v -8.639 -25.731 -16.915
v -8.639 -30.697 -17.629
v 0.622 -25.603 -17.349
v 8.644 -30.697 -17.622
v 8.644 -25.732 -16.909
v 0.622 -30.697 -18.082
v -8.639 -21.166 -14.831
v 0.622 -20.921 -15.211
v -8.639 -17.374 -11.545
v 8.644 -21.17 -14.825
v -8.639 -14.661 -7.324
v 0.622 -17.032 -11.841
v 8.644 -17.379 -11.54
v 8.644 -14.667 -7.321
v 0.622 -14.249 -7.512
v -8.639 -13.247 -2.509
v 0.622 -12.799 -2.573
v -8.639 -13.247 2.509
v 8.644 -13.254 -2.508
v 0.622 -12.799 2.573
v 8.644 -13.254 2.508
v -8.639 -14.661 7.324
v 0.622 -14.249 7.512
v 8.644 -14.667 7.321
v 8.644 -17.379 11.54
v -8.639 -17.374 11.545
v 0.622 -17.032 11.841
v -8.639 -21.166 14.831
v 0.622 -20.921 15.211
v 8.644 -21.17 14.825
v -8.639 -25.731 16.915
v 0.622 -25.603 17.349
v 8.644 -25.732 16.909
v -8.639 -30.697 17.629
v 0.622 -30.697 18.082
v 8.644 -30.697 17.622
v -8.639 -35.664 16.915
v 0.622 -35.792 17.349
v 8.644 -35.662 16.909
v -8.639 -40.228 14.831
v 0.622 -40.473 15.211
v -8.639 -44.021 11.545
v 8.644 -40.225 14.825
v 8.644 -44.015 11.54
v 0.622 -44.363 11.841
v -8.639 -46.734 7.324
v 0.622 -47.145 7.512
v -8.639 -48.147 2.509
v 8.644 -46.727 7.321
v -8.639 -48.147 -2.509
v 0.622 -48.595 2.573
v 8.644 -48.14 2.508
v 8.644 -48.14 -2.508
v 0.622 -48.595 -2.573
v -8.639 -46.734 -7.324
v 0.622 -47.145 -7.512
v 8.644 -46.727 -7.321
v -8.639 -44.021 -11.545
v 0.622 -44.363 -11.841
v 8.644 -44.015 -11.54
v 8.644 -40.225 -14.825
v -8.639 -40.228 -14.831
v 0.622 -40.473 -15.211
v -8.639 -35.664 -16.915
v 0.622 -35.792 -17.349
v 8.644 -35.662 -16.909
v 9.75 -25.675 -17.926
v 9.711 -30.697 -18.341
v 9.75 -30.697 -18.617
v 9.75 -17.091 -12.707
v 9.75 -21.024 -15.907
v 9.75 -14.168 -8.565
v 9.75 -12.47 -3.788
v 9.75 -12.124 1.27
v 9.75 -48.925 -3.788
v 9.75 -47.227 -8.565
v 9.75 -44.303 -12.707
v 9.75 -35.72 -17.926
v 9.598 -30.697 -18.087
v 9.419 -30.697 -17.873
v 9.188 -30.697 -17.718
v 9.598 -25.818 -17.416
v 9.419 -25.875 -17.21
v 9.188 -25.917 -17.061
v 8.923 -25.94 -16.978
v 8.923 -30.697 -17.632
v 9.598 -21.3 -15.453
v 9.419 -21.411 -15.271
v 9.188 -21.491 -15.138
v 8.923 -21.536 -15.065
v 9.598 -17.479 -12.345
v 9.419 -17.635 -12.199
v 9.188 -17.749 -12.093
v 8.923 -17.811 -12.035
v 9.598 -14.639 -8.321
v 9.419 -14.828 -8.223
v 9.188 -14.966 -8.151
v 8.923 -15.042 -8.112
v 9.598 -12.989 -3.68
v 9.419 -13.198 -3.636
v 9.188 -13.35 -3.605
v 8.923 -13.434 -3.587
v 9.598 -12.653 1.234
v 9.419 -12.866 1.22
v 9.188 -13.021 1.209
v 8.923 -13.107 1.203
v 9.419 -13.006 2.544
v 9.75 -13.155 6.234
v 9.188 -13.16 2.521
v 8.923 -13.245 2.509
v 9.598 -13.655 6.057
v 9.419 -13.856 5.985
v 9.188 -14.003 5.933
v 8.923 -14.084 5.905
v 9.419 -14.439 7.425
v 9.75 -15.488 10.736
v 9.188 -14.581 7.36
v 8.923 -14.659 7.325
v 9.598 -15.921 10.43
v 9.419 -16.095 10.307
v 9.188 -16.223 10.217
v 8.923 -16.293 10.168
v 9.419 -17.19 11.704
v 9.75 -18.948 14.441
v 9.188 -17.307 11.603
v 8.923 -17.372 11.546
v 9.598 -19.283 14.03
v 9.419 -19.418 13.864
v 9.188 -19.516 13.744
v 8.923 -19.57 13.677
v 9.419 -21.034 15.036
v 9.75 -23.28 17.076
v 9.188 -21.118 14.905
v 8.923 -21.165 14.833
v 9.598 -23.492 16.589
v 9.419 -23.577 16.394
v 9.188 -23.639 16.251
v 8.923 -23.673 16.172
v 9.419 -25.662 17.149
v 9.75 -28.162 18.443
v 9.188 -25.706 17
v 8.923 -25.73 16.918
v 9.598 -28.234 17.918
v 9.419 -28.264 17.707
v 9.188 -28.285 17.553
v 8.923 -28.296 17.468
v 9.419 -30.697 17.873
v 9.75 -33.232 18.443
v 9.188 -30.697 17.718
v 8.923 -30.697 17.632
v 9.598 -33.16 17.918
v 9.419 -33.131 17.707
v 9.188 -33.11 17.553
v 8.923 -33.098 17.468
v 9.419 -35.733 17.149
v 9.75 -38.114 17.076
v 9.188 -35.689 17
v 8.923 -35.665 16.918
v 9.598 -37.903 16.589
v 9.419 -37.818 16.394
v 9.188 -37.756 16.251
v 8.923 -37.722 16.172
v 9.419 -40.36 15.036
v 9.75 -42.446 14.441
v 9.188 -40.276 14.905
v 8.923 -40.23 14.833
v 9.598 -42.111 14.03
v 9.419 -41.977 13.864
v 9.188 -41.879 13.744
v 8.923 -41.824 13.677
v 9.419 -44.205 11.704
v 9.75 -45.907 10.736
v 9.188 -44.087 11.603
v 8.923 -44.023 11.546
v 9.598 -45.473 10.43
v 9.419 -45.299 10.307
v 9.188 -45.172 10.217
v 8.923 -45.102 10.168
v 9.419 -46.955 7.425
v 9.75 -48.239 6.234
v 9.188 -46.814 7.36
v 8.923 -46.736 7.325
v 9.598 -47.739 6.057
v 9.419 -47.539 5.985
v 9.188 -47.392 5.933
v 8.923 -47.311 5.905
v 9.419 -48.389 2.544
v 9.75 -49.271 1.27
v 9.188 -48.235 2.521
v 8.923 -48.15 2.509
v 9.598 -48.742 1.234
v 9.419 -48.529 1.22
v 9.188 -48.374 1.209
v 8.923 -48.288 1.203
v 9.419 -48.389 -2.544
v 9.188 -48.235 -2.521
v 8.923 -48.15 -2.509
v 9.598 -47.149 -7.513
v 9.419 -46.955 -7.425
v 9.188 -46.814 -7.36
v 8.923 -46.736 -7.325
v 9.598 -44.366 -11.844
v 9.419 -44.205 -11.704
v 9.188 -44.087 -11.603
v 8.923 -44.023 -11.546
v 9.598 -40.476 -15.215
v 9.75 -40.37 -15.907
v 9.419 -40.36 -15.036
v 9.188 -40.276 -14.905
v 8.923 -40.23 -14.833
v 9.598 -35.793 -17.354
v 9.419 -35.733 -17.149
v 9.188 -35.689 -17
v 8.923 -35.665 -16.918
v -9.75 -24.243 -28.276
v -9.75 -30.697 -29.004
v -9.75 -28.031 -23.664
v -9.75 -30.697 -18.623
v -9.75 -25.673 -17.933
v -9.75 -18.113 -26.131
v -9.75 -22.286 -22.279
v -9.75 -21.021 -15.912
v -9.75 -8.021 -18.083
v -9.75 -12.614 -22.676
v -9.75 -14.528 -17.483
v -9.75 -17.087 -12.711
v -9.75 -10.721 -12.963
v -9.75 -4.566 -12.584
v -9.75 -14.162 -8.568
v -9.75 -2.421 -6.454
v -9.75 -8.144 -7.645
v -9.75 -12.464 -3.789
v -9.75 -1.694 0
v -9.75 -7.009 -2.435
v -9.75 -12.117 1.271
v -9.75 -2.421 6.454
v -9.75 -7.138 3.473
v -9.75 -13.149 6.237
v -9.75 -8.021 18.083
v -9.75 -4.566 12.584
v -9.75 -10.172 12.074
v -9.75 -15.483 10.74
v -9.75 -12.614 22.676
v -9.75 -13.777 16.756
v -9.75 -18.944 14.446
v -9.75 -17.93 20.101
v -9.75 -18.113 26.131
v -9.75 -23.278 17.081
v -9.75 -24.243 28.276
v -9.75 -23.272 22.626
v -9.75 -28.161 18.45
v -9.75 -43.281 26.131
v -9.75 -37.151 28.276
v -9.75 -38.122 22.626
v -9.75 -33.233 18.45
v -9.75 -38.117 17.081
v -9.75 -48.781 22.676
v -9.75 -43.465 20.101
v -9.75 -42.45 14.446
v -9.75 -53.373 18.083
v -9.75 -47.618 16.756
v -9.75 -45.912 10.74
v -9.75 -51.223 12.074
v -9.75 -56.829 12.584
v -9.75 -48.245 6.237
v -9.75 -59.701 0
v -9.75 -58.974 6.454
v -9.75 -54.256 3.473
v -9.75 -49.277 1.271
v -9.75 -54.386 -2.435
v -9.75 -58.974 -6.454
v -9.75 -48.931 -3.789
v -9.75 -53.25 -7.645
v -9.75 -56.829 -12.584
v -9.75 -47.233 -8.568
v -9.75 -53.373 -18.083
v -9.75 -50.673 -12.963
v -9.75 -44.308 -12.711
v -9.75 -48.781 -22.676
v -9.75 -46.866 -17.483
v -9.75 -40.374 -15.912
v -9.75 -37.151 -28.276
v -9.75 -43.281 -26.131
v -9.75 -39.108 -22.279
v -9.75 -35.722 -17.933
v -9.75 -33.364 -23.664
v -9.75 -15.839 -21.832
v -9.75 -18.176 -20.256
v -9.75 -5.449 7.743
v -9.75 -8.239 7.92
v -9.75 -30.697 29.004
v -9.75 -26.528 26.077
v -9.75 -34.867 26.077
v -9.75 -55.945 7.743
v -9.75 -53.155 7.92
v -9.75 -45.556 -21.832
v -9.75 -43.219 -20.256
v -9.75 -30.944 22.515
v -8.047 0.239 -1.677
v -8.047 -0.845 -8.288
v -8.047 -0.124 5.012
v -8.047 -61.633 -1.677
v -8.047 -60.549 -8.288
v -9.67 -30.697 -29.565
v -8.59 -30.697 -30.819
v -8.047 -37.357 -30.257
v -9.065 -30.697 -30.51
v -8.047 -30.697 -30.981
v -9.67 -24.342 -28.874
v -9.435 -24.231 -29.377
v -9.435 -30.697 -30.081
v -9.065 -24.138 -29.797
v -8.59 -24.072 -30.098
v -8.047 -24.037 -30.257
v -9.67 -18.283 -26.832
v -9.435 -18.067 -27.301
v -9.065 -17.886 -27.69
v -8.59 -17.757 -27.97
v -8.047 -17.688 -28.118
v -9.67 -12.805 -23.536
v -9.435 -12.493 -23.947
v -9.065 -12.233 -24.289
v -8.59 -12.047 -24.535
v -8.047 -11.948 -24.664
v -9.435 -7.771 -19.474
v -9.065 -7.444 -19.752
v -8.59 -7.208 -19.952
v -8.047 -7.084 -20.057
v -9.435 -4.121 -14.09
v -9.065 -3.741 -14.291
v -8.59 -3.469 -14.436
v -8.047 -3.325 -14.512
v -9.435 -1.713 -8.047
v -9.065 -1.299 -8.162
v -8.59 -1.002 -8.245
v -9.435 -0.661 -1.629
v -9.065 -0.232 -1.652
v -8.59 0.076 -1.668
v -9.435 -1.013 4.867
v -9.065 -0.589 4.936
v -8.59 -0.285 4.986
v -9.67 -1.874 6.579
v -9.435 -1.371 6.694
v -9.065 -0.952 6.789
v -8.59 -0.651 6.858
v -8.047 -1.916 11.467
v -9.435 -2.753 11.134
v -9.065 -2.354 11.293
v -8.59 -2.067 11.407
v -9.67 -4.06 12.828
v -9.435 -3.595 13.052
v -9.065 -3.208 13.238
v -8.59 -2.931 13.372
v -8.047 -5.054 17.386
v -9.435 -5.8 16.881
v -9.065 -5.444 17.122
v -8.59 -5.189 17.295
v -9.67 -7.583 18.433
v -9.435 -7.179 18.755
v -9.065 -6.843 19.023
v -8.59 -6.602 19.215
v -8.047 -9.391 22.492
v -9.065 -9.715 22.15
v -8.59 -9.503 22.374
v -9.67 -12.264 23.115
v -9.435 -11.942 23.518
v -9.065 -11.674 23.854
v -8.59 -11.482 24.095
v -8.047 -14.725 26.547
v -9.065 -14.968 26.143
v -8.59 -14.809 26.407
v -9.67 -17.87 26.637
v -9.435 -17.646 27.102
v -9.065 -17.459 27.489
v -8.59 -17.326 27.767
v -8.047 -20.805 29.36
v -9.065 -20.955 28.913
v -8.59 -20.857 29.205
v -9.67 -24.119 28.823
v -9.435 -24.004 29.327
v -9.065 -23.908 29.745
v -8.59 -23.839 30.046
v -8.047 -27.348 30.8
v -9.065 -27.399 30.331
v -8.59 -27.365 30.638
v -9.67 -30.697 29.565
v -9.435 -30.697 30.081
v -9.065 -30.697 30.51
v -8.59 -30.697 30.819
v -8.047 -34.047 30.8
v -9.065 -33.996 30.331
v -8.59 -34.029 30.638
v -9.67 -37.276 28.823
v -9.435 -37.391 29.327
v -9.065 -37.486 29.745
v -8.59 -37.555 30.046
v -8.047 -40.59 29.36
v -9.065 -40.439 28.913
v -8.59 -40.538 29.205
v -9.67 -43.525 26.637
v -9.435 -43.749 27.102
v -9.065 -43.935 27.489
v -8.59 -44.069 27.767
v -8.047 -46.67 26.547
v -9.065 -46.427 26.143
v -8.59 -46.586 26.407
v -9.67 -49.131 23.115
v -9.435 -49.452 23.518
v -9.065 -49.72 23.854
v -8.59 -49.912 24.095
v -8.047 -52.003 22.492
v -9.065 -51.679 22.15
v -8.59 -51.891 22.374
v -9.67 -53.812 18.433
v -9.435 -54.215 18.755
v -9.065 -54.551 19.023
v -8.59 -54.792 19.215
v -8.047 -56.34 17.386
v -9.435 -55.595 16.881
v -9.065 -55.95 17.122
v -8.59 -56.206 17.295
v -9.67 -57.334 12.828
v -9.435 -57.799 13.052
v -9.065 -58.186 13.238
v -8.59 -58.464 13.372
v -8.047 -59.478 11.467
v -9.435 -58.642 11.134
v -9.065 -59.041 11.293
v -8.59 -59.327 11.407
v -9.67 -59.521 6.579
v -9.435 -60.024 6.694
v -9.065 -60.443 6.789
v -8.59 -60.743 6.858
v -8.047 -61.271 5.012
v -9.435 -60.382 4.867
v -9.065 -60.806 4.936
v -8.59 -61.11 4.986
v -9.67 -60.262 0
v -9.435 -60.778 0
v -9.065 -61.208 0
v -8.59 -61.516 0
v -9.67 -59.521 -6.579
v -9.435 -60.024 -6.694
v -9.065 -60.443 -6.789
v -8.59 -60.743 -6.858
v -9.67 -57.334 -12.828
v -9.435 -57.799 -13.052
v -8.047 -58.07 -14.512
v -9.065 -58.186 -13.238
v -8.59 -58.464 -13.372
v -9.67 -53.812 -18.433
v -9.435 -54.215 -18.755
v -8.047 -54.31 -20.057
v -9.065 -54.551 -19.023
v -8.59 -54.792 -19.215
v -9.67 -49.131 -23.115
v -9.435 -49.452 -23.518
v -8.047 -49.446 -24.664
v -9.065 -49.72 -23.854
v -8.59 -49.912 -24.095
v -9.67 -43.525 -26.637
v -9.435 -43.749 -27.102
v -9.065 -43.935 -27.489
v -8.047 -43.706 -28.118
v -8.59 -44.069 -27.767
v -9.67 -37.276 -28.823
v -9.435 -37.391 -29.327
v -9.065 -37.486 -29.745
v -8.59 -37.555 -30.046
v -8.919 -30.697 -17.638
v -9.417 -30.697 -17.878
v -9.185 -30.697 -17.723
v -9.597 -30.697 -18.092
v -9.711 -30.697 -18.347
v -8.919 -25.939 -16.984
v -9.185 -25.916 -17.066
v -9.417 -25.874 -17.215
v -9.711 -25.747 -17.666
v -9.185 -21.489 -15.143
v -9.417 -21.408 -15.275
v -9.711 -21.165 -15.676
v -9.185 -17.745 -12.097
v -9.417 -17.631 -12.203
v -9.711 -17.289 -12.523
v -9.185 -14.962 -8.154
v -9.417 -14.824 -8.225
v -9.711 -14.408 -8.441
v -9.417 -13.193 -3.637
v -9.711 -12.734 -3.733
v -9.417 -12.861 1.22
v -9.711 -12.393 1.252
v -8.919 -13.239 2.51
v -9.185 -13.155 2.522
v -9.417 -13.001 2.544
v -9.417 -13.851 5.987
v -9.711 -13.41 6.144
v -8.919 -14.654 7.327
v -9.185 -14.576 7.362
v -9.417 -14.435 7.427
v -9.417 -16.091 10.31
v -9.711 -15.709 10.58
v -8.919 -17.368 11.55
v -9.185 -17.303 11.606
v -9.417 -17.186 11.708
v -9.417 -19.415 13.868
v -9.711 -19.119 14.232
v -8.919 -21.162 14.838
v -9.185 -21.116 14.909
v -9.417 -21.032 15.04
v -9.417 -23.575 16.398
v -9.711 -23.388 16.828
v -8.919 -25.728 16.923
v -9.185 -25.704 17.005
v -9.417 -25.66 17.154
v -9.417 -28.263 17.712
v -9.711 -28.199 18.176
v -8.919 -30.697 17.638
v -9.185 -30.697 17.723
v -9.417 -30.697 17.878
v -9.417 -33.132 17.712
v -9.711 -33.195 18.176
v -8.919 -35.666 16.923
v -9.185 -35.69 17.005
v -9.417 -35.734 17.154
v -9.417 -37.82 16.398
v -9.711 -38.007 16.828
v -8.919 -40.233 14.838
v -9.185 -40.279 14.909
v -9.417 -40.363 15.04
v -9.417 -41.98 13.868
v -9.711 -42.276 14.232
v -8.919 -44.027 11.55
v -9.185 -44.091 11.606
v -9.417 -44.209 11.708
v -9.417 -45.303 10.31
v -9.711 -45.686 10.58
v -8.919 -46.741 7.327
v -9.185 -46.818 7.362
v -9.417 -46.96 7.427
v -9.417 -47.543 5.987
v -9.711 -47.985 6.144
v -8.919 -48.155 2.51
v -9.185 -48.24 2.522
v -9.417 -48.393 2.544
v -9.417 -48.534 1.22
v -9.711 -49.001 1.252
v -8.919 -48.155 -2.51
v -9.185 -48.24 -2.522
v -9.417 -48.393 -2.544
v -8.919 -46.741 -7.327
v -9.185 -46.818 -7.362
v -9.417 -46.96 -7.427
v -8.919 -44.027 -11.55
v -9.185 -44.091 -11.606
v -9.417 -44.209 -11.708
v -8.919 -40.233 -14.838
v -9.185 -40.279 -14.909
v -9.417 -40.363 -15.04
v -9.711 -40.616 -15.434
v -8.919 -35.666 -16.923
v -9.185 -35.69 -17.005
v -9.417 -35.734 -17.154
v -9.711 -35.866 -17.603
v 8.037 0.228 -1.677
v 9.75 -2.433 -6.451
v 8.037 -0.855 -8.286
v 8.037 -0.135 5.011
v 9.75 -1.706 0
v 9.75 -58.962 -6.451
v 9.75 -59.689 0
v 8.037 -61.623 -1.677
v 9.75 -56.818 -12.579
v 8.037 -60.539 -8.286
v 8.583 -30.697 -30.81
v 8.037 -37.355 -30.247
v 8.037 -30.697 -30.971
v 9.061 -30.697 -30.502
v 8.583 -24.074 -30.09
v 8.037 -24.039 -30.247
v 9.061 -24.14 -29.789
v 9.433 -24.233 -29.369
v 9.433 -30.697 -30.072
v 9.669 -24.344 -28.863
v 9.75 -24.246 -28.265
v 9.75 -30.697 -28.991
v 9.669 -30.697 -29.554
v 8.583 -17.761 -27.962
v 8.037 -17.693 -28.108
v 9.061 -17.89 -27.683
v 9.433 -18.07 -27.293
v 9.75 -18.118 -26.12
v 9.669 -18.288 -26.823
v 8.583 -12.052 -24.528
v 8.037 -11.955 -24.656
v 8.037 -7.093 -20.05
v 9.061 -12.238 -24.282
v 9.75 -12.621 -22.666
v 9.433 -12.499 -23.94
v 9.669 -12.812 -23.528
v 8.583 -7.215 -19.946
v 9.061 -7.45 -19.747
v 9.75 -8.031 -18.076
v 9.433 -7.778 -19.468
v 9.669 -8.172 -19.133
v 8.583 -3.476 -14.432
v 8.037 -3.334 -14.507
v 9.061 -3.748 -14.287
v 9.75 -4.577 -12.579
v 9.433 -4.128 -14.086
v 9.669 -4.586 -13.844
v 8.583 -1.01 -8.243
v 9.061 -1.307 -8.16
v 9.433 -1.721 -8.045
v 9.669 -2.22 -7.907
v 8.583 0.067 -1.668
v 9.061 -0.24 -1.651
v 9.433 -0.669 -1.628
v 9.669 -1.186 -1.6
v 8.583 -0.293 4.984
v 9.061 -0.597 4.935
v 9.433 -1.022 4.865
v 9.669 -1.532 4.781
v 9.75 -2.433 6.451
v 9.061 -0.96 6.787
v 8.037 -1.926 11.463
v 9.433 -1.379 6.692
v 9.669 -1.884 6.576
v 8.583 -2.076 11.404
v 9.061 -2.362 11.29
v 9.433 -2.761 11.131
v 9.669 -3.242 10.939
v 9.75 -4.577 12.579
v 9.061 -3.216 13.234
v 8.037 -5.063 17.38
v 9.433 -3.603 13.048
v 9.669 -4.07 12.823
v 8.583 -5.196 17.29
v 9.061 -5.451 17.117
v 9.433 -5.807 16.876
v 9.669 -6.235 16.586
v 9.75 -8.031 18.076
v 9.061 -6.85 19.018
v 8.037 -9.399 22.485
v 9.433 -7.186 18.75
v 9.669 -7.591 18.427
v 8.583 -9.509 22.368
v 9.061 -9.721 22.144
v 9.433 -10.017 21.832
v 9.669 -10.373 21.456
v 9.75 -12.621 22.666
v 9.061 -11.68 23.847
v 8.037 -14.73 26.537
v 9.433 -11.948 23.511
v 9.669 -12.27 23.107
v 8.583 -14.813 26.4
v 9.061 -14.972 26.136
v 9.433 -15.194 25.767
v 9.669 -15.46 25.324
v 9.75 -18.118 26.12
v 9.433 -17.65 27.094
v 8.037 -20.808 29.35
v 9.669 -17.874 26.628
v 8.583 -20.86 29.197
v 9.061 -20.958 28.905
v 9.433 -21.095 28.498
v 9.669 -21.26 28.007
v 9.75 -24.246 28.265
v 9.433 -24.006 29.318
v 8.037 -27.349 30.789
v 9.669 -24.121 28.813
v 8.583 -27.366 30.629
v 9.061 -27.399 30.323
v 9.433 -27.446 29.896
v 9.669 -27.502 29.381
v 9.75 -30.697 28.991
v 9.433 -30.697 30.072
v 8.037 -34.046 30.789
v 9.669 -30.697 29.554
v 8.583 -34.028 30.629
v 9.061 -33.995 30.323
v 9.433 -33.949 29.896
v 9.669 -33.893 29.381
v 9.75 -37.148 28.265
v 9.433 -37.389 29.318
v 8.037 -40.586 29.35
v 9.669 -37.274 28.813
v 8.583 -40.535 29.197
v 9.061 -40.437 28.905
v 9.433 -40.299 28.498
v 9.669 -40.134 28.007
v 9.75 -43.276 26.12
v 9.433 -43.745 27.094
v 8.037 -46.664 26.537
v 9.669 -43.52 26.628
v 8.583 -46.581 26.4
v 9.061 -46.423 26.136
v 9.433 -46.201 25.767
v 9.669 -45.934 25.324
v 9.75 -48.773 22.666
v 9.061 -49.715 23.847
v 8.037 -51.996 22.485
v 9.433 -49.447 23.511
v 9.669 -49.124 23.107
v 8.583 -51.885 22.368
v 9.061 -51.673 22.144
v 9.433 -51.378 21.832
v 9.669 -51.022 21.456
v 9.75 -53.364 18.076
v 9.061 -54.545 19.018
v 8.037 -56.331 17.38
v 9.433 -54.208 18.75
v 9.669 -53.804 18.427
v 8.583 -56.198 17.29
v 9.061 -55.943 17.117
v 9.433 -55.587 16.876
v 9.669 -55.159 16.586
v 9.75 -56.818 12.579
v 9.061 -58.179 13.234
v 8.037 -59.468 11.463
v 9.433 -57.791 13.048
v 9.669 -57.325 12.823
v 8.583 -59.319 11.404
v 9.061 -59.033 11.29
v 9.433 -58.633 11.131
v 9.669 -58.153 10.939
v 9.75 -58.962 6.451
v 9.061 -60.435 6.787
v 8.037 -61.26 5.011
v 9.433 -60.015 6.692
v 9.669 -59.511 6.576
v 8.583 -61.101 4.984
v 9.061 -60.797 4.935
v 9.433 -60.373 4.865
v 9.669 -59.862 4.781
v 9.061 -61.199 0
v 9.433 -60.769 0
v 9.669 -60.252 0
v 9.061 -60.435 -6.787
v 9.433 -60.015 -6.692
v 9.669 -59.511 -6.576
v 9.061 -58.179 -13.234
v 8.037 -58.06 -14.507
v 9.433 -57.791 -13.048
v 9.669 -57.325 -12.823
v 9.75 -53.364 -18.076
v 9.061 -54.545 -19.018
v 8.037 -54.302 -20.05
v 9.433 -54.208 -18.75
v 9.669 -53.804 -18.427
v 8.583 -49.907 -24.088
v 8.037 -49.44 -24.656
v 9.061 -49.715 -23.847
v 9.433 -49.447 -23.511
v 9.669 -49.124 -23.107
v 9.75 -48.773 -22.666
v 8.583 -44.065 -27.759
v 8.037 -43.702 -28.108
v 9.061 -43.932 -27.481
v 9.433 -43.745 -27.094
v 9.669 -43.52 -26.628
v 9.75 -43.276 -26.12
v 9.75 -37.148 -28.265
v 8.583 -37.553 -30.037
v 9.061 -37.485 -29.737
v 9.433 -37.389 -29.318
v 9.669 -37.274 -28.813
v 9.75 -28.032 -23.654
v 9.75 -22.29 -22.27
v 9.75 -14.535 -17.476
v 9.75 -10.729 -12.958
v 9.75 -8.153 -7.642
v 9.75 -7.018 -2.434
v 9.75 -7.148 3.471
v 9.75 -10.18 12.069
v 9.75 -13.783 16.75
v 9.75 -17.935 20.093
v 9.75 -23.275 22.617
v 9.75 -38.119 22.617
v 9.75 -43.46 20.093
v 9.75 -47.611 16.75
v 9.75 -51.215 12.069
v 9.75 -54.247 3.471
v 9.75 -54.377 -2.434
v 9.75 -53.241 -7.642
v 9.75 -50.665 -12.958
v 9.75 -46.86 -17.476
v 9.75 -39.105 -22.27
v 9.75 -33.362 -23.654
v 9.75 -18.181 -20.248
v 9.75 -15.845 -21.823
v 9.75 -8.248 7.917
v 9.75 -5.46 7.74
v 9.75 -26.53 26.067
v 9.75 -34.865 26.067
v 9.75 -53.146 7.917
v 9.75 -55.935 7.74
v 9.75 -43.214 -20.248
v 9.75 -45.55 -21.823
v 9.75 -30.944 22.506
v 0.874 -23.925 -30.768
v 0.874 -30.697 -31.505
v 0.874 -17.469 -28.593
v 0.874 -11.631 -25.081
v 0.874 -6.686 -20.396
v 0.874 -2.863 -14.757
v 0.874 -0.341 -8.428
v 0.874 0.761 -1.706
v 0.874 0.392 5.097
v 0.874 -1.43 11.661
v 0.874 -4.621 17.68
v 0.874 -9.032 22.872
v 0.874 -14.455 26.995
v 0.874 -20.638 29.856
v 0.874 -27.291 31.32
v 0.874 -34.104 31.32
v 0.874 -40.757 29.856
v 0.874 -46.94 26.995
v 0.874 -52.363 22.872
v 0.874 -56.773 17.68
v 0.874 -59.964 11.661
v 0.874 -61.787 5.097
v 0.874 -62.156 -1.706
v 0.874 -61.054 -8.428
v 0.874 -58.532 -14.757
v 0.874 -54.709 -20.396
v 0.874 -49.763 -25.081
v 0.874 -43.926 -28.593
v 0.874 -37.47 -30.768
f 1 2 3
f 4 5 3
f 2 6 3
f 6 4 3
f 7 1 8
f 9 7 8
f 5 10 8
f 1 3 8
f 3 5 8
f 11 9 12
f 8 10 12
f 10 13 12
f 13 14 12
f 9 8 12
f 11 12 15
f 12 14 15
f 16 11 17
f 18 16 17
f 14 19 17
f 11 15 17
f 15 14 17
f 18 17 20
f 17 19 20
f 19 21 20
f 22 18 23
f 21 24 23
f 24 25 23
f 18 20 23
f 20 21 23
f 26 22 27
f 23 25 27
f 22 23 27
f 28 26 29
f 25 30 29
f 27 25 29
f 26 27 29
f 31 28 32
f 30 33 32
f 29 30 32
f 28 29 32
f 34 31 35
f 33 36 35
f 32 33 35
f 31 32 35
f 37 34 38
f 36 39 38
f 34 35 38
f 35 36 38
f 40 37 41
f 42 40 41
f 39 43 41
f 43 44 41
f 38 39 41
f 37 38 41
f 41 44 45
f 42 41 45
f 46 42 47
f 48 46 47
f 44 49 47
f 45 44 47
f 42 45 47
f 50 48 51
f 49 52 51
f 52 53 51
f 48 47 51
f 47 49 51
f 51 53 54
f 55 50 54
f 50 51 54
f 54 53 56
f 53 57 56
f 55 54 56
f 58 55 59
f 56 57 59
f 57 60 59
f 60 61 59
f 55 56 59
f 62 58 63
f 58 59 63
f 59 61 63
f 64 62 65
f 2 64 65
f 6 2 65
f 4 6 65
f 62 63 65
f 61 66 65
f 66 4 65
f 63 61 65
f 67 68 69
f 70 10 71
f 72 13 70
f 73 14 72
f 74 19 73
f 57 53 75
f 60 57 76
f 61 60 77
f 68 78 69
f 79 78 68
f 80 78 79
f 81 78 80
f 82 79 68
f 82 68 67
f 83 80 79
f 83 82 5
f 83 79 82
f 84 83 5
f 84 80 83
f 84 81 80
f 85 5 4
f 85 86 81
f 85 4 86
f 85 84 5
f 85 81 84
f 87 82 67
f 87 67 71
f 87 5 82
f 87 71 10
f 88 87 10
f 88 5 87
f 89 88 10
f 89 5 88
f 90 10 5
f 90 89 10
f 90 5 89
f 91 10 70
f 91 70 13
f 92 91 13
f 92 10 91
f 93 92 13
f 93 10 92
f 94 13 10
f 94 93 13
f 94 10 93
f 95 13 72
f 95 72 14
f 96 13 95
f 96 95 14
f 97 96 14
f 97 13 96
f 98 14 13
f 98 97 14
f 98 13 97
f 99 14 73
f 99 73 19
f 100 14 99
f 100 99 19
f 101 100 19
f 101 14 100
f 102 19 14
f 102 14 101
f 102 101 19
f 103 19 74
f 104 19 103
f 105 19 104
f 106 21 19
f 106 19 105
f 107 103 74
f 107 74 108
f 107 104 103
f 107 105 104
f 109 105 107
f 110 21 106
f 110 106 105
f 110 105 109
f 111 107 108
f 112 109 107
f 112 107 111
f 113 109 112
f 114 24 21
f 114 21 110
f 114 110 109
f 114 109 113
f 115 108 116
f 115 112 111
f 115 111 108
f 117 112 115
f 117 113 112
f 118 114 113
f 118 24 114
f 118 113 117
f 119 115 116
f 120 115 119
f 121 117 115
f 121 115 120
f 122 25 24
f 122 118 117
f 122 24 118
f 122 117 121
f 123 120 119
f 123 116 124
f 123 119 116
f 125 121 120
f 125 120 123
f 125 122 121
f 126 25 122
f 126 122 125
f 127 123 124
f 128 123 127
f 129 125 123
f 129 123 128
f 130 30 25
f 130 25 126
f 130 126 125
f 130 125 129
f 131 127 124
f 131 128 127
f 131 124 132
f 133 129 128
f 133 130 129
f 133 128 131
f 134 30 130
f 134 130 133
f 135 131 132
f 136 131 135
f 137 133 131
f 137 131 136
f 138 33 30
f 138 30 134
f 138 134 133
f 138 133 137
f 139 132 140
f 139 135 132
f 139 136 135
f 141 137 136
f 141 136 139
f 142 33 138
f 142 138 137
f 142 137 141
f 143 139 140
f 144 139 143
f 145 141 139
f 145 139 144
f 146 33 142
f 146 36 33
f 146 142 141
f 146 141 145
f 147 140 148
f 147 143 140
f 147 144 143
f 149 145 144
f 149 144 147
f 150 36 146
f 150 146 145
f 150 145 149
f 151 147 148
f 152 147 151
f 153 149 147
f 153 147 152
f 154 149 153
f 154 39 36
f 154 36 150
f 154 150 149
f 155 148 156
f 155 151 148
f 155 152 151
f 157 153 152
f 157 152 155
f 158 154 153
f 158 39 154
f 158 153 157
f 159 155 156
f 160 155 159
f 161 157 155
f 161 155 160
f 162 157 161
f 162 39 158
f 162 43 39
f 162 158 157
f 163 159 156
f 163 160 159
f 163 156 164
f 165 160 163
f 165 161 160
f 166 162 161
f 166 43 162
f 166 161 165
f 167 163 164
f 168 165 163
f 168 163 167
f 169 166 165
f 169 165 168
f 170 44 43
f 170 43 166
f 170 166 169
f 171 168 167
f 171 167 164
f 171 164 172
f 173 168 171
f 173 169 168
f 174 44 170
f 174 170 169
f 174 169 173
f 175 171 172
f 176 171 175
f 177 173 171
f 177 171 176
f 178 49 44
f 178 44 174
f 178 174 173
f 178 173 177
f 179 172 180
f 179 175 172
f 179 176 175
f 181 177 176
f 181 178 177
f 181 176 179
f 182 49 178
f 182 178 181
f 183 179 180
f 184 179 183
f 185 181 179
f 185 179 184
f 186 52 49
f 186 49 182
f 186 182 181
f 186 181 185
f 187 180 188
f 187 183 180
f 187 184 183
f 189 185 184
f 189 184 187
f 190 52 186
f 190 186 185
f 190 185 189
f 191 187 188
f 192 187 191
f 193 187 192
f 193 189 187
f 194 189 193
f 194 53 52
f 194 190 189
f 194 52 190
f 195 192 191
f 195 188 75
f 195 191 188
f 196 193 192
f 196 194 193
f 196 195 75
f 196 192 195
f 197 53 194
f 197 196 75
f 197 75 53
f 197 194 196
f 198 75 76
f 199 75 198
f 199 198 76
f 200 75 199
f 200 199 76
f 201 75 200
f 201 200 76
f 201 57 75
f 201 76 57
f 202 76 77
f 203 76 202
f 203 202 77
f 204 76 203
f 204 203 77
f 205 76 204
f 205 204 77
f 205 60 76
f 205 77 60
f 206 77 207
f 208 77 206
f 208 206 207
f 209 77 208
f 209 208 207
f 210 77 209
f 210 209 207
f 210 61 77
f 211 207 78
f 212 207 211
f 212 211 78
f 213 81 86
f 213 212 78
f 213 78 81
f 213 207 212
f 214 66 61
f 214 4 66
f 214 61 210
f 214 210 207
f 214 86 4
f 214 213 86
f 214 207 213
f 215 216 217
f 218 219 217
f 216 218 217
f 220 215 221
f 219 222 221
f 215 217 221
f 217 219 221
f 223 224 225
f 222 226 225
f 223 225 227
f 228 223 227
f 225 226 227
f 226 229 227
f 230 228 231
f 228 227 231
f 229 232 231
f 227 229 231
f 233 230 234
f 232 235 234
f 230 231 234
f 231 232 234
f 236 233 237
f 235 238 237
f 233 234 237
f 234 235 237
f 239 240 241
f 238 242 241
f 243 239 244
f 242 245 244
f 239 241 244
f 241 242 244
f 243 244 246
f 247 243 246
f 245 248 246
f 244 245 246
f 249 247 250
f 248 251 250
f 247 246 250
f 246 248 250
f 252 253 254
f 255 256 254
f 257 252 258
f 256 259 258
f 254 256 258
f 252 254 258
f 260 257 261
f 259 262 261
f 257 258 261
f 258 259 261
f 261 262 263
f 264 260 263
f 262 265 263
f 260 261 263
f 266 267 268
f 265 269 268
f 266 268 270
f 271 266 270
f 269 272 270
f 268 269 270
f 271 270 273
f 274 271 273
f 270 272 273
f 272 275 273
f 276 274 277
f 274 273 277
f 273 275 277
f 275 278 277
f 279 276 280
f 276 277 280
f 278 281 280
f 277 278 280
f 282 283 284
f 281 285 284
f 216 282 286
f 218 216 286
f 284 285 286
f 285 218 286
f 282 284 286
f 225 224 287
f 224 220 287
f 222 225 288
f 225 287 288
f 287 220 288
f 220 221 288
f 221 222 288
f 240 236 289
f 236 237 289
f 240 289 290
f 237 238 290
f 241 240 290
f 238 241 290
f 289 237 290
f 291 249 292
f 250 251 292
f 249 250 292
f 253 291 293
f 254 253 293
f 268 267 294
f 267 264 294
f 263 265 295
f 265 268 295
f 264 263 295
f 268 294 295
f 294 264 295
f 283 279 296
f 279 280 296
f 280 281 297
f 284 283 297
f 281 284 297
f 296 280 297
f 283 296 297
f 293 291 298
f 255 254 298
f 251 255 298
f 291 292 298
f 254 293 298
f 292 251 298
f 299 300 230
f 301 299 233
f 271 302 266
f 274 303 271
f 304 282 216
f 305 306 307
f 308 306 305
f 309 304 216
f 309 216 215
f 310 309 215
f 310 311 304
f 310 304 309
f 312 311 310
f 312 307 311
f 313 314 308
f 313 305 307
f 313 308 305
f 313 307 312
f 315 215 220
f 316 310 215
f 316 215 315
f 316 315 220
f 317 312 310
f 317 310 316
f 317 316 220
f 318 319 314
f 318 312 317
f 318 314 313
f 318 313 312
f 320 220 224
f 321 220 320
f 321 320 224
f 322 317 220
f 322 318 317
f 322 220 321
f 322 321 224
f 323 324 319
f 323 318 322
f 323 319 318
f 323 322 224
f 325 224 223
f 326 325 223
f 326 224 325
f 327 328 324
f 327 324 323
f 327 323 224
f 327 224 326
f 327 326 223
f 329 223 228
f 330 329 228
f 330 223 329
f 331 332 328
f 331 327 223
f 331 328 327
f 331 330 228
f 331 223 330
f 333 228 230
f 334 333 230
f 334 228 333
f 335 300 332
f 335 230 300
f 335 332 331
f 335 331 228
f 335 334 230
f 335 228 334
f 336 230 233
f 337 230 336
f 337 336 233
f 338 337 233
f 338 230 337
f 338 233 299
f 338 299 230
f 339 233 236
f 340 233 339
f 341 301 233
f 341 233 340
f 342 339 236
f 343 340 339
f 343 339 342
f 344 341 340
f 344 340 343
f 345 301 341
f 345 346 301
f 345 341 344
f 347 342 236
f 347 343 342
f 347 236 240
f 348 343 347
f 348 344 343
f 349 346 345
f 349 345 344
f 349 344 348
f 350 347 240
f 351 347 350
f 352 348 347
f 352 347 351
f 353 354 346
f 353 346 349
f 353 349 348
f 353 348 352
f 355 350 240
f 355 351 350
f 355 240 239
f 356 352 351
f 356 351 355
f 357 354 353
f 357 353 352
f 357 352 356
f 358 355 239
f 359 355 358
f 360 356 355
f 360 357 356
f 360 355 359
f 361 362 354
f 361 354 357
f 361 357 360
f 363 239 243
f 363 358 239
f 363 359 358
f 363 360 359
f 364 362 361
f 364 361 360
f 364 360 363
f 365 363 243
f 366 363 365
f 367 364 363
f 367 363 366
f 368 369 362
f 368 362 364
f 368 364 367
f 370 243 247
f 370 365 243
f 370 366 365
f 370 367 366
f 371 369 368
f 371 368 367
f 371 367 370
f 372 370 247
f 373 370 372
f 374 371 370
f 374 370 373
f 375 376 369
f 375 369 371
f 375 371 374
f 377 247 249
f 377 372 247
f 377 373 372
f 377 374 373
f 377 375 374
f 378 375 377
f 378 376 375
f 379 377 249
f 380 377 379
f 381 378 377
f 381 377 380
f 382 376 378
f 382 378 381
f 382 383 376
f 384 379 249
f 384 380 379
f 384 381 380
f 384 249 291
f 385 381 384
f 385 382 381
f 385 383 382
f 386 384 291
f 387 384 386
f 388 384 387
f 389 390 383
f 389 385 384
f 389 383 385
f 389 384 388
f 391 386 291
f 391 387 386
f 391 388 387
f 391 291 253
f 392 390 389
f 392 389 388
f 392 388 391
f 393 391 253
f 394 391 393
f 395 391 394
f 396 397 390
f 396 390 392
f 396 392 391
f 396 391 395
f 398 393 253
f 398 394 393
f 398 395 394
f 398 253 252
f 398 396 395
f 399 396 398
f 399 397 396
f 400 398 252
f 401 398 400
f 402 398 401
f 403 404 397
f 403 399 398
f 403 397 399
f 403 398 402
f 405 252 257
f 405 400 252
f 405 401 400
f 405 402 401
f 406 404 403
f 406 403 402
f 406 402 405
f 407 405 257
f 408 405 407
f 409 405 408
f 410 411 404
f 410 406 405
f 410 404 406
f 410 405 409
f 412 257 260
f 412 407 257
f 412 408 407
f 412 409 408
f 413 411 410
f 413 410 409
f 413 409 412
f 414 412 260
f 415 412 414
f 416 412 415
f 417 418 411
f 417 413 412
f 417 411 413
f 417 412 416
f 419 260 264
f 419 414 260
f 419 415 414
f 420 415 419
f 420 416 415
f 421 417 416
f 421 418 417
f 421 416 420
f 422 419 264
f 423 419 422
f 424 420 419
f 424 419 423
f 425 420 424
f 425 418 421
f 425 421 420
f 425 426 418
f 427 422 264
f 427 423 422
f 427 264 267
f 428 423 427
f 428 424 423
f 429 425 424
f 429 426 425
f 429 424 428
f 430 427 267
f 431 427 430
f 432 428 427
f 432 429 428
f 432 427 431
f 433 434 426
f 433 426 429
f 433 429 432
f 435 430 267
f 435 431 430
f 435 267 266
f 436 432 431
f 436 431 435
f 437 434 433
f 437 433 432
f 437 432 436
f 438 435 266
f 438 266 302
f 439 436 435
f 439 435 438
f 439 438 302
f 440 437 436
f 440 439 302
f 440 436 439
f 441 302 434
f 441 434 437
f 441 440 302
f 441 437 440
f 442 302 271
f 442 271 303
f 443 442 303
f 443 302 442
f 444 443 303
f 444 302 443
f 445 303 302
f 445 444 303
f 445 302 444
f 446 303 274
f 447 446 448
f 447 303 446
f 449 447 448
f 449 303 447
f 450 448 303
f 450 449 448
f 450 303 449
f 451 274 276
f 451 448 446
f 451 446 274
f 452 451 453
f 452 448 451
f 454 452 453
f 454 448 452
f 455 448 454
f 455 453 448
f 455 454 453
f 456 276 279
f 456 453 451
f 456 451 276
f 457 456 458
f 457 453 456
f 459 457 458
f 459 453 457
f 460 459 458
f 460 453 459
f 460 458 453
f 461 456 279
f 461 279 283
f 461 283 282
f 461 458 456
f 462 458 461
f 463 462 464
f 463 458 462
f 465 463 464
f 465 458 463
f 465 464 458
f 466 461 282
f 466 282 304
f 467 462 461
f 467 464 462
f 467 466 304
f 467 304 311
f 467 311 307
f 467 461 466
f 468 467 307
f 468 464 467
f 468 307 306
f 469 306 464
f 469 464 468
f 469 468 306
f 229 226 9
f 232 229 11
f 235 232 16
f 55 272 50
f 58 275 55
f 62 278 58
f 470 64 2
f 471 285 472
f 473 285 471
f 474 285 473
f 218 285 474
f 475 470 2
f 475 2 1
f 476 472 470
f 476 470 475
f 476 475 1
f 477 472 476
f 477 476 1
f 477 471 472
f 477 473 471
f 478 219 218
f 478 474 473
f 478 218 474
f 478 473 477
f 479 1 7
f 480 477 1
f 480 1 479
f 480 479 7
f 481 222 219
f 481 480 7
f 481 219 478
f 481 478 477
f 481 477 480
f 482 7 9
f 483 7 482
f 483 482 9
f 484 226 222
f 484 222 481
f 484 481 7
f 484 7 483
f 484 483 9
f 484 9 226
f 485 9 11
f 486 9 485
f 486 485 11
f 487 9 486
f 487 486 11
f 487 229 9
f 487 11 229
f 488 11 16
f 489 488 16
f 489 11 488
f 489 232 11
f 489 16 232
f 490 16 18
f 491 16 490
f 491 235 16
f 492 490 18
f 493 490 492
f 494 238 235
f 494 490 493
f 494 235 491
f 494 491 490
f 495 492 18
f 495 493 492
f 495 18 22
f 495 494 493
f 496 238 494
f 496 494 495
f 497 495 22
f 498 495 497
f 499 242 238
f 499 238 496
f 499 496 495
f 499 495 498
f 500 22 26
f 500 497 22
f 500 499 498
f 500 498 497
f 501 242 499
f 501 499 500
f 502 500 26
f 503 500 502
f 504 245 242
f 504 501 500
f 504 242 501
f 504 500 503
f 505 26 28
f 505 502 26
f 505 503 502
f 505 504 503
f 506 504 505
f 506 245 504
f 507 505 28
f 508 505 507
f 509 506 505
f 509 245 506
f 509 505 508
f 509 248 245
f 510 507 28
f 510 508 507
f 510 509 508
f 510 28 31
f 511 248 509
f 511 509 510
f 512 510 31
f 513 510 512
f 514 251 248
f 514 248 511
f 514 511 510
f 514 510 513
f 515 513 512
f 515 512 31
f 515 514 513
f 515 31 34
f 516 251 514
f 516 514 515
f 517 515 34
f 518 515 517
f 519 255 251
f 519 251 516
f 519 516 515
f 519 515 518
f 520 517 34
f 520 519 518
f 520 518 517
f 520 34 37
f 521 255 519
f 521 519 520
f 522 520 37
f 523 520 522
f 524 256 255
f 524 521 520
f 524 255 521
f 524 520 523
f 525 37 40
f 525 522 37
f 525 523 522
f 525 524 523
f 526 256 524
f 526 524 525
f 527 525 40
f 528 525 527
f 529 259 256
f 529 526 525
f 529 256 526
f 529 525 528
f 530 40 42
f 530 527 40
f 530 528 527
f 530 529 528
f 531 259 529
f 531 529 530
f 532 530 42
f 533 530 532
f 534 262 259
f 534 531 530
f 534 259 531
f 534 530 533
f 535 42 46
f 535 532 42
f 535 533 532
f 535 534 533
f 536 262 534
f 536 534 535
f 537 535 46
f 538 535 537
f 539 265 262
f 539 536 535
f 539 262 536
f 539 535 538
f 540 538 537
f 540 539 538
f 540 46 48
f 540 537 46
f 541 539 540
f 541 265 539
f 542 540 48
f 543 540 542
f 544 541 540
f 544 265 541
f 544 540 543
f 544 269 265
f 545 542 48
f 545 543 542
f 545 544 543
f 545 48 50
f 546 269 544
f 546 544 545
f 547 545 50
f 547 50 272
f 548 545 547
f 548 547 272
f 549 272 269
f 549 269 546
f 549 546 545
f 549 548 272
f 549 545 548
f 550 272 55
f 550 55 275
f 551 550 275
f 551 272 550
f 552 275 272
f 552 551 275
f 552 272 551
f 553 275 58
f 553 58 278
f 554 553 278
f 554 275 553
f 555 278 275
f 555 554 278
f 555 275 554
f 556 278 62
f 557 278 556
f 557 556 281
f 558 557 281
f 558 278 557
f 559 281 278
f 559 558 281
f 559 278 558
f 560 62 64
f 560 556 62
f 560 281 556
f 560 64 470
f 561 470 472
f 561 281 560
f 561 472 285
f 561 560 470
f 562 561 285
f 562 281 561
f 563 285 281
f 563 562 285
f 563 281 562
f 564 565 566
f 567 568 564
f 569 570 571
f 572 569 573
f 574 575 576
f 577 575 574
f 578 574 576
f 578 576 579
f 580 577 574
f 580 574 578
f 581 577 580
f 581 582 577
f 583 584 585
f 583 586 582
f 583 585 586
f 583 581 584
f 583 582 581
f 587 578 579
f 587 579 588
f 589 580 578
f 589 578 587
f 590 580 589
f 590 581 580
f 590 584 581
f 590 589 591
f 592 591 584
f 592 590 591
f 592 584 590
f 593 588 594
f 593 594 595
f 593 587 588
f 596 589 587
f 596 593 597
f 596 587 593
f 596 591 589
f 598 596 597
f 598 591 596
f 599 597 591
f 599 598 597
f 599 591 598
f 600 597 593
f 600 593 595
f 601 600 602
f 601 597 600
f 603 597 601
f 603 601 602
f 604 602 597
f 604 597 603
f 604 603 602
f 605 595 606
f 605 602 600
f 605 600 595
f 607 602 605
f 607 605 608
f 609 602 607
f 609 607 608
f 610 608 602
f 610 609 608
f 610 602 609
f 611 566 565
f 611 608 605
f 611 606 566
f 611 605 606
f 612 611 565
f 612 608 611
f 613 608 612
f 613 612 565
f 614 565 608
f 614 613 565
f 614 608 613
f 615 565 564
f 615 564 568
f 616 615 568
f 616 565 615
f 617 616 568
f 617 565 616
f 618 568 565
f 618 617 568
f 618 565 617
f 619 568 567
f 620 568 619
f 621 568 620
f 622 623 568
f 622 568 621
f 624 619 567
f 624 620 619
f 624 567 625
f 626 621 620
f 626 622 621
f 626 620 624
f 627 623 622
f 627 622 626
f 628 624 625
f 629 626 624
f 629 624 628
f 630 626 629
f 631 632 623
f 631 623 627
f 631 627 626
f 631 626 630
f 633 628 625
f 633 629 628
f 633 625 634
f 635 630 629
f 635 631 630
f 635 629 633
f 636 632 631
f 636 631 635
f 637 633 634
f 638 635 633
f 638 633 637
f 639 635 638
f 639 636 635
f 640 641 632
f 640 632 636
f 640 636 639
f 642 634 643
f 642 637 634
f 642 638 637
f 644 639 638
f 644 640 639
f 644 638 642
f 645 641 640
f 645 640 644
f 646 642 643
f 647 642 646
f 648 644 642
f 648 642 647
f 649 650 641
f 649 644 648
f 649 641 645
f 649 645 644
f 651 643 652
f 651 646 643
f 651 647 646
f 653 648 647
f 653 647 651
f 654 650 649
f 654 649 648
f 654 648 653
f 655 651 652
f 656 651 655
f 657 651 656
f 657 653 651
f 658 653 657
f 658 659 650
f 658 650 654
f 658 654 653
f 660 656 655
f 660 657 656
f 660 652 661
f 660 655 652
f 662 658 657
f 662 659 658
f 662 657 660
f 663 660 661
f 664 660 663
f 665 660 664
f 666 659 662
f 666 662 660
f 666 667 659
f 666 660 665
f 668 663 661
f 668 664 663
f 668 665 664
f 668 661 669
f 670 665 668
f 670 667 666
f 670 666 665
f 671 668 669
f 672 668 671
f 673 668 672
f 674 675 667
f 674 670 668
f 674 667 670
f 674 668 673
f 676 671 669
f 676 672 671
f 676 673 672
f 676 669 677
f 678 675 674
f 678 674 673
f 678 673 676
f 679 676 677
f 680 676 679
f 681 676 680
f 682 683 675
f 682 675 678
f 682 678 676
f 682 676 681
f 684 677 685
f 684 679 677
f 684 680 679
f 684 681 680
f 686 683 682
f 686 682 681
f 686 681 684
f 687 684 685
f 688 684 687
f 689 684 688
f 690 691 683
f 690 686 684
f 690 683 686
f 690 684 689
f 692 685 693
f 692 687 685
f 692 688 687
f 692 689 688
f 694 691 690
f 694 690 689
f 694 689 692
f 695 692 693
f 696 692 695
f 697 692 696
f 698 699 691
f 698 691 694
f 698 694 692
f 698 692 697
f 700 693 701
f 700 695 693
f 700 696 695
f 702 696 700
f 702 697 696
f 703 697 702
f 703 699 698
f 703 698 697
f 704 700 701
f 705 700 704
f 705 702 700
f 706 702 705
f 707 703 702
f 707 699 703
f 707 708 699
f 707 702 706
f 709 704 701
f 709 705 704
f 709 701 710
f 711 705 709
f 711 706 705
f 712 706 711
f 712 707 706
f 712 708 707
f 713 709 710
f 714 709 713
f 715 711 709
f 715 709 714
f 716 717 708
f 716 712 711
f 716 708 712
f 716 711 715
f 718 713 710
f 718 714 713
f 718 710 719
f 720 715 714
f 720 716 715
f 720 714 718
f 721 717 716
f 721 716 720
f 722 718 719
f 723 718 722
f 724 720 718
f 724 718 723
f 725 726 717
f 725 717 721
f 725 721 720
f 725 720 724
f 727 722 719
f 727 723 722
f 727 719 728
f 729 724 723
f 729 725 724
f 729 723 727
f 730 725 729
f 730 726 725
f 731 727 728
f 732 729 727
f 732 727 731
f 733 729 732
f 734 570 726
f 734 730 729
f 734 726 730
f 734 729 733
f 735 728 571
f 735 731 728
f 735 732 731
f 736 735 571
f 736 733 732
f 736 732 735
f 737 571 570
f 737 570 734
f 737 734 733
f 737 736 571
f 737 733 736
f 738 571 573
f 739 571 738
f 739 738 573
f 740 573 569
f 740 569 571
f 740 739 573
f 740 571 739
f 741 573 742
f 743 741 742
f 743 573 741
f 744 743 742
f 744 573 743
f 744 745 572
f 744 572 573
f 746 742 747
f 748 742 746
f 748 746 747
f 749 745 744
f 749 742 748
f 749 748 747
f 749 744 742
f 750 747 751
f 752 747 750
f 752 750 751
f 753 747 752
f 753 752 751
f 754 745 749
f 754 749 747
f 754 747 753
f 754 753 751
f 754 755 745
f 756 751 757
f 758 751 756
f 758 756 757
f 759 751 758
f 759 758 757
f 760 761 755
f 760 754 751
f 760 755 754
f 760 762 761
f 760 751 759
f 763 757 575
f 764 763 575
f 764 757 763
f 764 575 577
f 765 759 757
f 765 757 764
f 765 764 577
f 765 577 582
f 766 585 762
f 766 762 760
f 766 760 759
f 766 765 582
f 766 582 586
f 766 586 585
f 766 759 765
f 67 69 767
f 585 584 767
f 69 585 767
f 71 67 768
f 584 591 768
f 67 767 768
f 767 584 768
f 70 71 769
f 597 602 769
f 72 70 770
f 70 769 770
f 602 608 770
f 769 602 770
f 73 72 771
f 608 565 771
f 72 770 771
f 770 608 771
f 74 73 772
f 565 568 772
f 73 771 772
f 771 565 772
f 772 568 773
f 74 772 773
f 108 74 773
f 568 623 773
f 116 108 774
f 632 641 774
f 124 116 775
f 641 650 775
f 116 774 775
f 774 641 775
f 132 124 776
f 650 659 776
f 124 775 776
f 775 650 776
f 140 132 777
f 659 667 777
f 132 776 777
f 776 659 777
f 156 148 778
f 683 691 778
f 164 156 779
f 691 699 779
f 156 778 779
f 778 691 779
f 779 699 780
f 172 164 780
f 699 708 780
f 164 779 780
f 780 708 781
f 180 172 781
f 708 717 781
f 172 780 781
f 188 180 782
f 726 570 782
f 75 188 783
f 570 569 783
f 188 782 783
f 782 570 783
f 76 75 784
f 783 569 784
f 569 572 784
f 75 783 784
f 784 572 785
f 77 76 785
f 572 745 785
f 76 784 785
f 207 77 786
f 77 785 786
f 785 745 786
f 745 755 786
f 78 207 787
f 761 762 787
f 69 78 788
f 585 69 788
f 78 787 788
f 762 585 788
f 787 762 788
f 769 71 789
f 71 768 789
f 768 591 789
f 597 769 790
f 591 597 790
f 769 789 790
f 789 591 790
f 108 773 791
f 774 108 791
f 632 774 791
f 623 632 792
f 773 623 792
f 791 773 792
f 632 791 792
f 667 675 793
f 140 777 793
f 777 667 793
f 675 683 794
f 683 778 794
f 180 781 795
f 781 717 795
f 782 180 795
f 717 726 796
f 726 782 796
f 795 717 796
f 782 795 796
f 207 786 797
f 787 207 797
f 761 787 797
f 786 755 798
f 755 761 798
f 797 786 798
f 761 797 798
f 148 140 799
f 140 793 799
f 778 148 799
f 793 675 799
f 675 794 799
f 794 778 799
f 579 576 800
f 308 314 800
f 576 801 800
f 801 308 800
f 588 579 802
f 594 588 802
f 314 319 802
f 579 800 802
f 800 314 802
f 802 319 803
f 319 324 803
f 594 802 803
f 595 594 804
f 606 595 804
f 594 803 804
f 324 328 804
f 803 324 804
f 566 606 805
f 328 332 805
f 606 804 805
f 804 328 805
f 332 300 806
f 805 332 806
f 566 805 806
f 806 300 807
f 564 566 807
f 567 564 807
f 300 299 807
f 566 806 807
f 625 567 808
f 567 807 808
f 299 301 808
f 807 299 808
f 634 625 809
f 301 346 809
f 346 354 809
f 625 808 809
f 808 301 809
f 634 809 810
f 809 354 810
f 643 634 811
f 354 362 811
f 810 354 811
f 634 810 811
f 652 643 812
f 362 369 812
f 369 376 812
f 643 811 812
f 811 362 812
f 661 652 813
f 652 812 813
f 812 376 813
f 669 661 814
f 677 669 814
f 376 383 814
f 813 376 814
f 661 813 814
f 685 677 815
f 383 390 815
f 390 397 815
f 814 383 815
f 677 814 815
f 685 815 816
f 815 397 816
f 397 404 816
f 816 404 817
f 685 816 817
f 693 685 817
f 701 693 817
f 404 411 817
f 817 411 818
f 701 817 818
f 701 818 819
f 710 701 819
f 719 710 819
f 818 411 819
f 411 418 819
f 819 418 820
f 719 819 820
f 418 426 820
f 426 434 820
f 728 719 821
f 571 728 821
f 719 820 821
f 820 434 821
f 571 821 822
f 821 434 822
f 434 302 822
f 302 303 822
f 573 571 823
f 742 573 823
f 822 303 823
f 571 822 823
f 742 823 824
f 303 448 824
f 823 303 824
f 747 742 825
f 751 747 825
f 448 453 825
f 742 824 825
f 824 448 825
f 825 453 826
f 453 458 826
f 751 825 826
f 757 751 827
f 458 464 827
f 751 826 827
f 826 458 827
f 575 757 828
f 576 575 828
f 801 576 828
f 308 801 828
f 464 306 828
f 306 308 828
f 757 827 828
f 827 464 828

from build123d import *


with BuildPart() as part:
    # Balayage1: sweep along a path in Esquisse2
    with BuildLine(Plane(origin=(0, 0, 0), x_dir=(0, 0, -1), z_dir=(1, 0, 0))) as balayage1_path:
        CenterArc((0, -30.697276077), 18.08, 0, 360)
    # Esquisse1 → Balayage1 (sweep)
    with BuildSketch(Plane.XY):
        with BuildLine():
            Line((9.75, -1.705844805), (9.75, -12.080482835))
            ThreePointArc((9.75, -12.080482835), (9.418659658, -12.824051434), (8.644211477, -13.074871486))
            add(Edge.make_bspline(
                [(-8.639497918, -13.06789707), (-5.962658662, -12.770278108), (1.018950966, -12.480757929), (5.401157061, -12.729857554), (8.644211477, -13.074871486)],
                knots=[0.057340546, 0.057340546, 0.057340546, 0.057340546, 0.473274059, 0.946548119, 0.946548119, 0.946548119, 0.946548119], degree=3))
            ThreePointArc((-8.639497918, -13.06789707), (-9.416895013, -12.819172867), (-9.75, -12.074021177))
            Line((-9.75, -12.074021177), (-9.75, -1.69364433))
            ThreePointArc((-9.75, -1.69364433), (-9.265544866, -0.388606491), (-8.04687624, 0.284199066))
            add(Edge.make_bspline(
                [(-8.04687624, 0.284199066), (-5.709420251, 0.63505351), (1.539056453, 0.939568483), (5.000411491, 0.71370426), (8.036962294, 0.273461297)],
                knots=[0.08950135, 0.08950135, 0.08950135, 0.08950135, 0.457115955, 0.91423191, 0.91423191, 0.91423191, 0.91423191], degree=3))
            ThreePointArc((8.036962294, 0.273461297), (9.262270576, -0.397014141), (9.75, -1.705844805))
        make_face()
    sweep(path=balayage1_path.line)


solid = part.part
